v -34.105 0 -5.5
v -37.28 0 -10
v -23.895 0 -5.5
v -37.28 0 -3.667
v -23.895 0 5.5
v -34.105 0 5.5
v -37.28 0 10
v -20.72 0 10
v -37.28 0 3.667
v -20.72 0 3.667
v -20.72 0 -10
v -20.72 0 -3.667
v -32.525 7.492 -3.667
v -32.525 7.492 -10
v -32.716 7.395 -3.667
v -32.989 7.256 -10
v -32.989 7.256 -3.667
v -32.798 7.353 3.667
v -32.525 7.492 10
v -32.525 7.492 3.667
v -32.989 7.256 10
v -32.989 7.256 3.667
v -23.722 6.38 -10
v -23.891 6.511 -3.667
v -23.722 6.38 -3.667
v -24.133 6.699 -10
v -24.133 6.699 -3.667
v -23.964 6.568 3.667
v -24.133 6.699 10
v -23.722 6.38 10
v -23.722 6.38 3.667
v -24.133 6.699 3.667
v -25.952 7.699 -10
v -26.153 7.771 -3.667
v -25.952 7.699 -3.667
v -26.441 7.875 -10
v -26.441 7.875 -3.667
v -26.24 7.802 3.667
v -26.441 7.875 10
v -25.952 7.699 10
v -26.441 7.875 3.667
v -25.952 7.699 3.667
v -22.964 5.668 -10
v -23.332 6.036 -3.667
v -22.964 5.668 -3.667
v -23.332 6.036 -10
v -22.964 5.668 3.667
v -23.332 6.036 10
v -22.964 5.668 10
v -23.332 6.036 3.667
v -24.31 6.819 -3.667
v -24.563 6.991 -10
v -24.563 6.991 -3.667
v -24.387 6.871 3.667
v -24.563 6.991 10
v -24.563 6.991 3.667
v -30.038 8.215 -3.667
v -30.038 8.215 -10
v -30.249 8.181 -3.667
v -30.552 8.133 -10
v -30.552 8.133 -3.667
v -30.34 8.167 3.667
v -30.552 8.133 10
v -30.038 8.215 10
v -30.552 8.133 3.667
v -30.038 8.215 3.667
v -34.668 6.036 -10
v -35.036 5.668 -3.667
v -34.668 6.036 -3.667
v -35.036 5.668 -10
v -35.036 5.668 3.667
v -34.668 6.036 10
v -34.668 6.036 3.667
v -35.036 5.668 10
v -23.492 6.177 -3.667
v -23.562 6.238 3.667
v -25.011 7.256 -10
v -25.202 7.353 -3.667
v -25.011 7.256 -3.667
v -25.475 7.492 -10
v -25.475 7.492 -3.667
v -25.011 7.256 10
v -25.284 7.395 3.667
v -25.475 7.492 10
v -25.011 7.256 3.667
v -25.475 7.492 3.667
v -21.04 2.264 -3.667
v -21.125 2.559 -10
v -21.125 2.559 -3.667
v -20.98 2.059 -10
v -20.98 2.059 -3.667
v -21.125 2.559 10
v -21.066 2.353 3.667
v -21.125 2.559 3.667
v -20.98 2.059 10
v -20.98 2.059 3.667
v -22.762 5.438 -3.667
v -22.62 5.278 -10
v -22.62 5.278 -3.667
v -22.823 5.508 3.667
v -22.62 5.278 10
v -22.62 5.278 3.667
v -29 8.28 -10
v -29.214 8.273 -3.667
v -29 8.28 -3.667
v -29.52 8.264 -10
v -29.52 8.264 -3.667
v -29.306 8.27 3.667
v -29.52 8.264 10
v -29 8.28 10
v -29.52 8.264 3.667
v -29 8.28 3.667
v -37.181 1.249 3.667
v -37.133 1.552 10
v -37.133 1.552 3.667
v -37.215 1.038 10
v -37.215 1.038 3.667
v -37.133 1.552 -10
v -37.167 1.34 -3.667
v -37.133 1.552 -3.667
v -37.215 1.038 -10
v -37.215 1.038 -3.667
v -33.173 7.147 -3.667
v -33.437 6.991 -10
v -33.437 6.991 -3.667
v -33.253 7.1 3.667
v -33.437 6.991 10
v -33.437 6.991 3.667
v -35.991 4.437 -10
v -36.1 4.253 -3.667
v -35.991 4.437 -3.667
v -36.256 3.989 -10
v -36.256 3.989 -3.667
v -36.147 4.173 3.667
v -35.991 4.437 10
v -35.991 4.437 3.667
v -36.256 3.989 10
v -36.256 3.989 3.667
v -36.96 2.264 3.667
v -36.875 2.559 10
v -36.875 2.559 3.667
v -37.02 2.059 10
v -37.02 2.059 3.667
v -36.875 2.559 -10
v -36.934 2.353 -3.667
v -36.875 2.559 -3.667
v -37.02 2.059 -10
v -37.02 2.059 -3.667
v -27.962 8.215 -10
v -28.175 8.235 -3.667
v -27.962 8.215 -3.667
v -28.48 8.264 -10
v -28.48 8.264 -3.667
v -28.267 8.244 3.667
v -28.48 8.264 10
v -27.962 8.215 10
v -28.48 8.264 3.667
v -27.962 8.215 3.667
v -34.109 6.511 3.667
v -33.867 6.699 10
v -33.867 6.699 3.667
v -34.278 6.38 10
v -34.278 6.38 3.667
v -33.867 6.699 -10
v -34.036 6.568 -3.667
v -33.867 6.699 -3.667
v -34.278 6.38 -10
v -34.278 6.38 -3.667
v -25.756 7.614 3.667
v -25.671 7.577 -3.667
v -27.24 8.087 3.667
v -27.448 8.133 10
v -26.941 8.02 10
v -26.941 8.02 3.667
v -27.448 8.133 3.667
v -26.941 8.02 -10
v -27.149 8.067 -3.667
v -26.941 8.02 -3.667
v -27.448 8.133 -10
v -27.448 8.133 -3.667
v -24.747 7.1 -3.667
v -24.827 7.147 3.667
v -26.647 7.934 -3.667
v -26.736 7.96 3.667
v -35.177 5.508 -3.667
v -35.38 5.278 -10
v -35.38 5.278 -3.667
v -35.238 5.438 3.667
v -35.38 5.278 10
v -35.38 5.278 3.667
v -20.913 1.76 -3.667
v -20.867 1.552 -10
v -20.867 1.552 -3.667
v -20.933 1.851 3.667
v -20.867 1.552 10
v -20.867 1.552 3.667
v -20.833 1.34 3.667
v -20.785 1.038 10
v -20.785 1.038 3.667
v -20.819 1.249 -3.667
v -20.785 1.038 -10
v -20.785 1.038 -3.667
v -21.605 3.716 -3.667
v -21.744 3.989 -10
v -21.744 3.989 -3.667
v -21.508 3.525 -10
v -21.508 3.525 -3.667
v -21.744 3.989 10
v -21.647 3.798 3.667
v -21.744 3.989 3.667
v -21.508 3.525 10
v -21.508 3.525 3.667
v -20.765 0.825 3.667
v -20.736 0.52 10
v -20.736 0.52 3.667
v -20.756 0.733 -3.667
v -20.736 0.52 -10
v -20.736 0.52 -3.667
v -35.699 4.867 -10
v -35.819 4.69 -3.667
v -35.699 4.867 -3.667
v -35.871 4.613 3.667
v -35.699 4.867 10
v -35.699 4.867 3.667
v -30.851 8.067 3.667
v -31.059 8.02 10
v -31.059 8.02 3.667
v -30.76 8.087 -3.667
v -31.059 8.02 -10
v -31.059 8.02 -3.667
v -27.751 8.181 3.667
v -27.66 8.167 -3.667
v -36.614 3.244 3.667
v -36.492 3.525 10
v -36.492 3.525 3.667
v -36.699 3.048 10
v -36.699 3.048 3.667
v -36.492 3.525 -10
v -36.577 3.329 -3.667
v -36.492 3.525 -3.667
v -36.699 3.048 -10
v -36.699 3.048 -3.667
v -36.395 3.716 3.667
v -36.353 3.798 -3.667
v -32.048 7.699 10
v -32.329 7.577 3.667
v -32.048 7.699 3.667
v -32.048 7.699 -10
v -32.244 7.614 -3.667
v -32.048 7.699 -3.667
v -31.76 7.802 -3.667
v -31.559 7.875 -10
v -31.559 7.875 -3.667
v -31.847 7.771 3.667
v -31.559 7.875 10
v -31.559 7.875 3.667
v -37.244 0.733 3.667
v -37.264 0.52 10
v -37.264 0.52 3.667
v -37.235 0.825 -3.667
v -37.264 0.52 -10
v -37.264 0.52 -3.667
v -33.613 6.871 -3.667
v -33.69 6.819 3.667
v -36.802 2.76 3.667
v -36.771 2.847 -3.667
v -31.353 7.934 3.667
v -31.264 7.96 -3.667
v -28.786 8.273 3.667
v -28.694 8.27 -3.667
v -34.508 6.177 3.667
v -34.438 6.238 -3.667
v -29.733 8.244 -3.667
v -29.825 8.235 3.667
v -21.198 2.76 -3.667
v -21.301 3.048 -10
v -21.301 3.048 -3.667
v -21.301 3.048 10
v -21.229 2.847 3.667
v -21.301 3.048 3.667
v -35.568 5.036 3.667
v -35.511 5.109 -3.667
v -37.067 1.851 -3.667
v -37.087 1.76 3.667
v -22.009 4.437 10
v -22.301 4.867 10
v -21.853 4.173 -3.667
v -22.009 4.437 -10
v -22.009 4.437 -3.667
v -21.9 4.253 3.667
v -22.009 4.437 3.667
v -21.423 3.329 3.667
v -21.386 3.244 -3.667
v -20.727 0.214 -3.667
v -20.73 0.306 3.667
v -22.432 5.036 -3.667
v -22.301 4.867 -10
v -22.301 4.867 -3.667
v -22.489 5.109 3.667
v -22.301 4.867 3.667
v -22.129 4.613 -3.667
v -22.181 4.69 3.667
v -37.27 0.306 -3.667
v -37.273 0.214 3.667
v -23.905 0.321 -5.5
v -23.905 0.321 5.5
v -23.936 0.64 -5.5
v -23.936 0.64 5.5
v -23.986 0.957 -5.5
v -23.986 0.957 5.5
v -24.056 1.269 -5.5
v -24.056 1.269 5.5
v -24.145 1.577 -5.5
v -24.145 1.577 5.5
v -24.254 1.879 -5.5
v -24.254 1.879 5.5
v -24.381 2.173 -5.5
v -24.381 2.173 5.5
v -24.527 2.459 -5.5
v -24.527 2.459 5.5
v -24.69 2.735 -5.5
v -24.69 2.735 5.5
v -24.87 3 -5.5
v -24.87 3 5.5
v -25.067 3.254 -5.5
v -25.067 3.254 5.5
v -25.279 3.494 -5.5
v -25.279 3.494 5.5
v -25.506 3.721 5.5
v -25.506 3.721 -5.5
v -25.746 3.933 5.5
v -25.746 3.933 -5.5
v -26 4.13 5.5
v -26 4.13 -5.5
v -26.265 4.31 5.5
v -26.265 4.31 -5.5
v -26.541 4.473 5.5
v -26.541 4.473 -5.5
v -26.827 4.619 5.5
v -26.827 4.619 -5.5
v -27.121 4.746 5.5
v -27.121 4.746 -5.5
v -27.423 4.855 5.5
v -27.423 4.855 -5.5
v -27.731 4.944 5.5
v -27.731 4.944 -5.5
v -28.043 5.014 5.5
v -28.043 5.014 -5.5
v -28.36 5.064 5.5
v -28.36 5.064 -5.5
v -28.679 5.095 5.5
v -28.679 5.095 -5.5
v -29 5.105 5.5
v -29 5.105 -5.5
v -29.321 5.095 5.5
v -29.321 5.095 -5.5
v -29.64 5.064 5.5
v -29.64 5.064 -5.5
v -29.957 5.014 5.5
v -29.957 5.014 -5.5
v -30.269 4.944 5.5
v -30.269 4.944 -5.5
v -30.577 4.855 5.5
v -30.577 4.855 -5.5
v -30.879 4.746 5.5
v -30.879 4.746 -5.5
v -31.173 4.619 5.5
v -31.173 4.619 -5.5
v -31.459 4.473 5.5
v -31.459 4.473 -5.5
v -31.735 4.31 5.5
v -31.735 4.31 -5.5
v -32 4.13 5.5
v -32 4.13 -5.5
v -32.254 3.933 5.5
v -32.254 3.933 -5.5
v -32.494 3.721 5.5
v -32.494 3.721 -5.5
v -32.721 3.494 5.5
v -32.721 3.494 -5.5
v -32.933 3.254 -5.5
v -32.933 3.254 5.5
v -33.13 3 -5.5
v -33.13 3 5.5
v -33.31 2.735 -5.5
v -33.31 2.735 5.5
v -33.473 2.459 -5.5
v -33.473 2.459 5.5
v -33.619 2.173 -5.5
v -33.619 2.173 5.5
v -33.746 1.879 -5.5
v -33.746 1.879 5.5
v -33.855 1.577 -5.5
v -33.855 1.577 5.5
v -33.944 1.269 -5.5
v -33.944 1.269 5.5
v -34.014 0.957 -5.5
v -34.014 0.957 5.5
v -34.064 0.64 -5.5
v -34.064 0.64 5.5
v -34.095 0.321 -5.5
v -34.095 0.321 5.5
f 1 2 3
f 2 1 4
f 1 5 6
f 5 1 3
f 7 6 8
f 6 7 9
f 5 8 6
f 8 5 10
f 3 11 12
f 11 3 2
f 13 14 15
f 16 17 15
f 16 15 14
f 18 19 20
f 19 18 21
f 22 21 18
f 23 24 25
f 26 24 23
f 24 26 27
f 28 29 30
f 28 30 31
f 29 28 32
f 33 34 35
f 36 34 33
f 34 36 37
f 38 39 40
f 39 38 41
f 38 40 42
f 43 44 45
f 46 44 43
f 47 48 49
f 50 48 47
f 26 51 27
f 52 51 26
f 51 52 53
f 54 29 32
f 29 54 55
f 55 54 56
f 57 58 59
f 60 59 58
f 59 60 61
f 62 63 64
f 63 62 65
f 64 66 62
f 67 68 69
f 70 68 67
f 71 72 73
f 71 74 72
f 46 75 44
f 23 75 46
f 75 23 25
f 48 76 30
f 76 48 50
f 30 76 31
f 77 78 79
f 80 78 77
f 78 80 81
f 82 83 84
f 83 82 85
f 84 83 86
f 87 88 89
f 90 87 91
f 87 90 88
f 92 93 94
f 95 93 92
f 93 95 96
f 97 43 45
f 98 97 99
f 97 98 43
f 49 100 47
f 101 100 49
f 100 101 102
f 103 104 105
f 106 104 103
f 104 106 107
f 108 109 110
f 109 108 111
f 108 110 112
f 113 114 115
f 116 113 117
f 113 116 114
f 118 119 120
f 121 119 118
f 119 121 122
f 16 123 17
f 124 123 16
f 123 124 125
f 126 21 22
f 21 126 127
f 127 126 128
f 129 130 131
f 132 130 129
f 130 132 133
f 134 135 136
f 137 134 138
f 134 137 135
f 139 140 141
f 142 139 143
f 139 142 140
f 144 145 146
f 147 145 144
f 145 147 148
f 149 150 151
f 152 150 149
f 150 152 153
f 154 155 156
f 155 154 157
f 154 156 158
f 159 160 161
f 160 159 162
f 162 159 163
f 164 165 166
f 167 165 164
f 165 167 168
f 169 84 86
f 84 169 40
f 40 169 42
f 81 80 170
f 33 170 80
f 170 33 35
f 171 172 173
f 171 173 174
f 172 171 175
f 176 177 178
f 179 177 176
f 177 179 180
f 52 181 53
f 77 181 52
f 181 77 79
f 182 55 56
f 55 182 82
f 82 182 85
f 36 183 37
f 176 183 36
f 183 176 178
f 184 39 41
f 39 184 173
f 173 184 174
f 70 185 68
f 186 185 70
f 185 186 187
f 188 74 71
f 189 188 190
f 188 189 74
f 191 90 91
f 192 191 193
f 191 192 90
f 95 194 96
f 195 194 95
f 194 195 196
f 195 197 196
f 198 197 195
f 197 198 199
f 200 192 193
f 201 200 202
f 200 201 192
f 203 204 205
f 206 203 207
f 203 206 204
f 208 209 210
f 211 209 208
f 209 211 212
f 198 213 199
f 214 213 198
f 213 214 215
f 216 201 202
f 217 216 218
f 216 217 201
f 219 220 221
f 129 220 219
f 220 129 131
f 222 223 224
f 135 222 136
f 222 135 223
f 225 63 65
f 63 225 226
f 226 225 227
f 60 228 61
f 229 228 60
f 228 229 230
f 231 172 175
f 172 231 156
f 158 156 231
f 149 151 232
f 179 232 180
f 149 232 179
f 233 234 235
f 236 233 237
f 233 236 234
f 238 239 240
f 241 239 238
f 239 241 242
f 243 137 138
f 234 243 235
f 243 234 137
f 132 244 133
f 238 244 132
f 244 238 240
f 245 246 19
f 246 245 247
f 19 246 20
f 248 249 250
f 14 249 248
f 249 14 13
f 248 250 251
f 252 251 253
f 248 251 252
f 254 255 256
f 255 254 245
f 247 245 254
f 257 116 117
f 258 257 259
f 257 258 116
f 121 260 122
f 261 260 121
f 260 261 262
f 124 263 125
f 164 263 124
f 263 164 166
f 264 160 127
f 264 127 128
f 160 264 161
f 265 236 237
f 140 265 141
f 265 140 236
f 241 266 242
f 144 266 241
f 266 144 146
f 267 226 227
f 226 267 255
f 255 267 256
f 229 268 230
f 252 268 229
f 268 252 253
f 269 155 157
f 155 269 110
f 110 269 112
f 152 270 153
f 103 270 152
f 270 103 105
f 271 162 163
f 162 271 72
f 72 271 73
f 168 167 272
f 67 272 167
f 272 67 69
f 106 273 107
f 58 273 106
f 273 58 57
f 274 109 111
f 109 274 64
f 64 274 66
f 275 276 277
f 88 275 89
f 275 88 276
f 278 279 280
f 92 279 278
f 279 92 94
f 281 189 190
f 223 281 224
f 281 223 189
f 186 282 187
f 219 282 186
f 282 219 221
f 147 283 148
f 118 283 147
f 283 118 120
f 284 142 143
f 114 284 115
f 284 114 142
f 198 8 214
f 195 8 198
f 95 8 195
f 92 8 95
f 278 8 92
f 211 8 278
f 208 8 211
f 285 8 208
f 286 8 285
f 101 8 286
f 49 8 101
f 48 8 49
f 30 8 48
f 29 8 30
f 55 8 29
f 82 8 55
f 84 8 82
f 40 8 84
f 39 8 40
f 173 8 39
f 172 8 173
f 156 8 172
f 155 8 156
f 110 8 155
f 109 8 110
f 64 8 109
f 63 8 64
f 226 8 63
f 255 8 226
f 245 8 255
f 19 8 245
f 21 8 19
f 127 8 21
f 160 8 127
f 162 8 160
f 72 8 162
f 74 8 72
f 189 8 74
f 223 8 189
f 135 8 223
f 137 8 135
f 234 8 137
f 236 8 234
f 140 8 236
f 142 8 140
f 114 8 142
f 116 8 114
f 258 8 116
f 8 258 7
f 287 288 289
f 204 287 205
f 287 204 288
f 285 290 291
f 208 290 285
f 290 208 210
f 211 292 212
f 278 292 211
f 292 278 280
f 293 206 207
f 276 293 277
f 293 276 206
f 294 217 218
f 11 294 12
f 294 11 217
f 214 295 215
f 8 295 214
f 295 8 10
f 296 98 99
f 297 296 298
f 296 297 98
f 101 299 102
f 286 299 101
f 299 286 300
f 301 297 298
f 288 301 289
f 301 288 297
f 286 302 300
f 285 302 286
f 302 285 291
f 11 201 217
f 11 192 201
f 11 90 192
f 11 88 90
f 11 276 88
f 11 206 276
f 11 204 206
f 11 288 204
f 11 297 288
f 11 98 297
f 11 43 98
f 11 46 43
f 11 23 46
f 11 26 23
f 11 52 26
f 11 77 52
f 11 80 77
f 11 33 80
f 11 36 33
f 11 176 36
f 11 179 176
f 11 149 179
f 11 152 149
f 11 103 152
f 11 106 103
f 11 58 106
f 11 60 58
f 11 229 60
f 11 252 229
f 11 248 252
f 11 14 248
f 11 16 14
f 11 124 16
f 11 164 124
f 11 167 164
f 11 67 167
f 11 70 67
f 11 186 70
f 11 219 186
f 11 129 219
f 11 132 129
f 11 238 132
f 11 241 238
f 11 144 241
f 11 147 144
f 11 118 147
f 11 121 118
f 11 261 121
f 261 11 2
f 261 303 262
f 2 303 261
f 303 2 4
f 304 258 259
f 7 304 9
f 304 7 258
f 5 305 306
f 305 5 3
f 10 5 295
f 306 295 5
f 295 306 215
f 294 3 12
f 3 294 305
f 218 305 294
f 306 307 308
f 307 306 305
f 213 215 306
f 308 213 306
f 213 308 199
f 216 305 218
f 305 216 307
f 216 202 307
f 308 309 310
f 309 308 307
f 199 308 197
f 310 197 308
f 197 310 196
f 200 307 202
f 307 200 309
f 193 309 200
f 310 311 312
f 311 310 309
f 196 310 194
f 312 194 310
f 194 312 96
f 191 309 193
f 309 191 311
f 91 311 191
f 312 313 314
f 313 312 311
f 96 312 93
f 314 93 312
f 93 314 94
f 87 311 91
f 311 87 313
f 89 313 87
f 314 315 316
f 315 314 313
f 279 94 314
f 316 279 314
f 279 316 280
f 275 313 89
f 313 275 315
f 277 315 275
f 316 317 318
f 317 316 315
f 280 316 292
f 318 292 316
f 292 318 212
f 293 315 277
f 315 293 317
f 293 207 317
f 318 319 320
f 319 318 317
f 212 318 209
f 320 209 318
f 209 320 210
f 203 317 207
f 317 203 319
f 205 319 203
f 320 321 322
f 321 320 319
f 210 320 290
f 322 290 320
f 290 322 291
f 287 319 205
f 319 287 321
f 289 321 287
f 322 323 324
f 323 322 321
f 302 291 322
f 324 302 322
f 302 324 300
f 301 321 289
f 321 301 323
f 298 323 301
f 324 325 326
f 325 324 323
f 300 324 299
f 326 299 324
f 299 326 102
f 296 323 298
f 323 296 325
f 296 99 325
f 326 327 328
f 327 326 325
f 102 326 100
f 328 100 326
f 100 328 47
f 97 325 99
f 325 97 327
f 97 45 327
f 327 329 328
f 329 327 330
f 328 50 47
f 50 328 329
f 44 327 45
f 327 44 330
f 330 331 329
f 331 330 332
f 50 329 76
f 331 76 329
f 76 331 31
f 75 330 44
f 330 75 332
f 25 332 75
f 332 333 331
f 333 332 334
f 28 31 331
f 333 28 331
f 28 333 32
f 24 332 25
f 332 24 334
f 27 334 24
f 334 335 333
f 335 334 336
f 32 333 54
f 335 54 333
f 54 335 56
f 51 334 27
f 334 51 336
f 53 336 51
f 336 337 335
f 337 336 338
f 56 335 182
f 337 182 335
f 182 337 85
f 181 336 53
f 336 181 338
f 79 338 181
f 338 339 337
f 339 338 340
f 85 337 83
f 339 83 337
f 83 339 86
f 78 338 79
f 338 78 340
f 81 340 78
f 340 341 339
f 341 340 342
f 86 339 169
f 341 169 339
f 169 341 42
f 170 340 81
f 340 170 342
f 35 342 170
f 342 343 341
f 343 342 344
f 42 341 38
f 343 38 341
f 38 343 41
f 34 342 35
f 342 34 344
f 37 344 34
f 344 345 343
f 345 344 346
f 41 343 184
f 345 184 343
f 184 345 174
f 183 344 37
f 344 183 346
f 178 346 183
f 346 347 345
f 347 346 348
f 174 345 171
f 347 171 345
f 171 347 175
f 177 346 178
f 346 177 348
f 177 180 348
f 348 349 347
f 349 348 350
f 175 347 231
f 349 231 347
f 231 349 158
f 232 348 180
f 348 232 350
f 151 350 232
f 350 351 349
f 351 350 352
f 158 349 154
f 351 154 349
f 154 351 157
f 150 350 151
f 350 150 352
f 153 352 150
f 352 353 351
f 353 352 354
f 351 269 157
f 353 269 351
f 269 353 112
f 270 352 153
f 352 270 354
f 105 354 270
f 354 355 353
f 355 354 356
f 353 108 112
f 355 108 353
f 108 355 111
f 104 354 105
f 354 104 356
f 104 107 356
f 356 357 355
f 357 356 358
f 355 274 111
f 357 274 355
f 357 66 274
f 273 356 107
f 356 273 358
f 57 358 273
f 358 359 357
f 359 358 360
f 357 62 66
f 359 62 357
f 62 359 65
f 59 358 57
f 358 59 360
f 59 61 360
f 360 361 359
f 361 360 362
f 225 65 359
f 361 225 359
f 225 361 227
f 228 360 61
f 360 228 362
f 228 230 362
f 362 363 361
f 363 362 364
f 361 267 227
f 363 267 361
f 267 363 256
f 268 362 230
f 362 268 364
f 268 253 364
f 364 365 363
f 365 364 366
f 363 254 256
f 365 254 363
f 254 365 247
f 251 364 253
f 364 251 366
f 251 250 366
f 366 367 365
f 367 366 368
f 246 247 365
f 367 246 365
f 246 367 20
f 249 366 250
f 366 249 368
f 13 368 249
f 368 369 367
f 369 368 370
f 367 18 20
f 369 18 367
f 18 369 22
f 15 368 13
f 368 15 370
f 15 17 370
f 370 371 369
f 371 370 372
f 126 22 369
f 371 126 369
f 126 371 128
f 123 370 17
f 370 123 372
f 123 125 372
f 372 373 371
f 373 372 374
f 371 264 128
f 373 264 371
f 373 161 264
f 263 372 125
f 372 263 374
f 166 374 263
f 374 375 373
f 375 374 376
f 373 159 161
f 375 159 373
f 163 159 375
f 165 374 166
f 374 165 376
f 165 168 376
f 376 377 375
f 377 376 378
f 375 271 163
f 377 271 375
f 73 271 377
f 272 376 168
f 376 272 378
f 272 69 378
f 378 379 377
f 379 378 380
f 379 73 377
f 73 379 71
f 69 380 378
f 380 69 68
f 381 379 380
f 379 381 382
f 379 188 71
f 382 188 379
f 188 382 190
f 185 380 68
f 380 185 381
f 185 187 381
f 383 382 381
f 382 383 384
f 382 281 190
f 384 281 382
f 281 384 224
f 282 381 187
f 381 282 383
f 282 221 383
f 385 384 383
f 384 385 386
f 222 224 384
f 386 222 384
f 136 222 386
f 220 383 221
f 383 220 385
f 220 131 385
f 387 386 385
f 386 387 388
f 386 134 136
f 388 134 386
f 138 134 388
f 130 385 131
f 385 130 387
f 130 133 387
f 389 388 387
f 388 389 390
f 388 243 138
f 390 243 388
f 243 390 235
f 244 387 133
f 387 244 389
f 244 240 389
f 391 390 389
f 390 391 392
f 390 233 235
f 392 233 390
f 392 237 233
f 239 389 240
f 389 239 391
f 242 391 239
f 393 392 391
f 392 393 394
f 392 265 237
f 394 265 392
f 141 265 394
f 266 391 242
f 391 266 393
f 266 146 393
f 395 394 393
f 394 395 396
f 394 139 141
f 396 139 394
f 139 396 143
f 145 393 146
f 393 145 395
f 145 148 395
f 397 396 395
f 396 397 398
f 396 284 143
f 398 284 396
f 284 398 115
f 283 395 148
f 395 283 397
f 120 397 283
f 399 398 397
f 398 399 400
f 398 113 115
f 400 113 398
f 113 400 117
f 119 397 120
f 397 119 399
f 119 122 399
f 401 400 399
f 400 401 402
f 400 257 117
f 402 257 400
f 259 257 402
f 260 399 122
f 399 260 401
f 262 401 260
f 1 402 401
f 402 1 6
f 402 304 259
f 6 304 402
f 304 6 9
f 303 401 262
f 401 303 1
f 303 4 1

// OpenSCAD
$fn = 100;

PRINT_WHOLE = true;

PRINT_TOP_ARCH = false;

SEGMENT_HT = 20;
TAIL_WD = 10;
TAIL_HT = 3;
TOOTH_BITE = 2;
// TAIL_CLEARANCE = 2;


// have decided 18,36,72
// NOMINAL_SEGMENT_RAD = 18;
NOMINAL_SEGMENT_RAD = 36;
// NOMINAL_SEGMENT_RAD = 72;

NEG_COEFF = 0.46;


cylinder_rad = NOMINAL_SEGMENT_RAD;// - TAIL_HT;
segment_rad = cylinder_rad;
neg_segment_rad = NOMINAL_SEGMENT_RAD*NEG_COEFF; //- TAIL_HT;
tail_triangle_rad = (TAIL_WD * sqrt(3))/3;
// tail_triangle_rad = 8;

module body_and_tail(this_cylinder_rad, negative=false){
    NEGATIVE_RAD_OS = 0.75;
    scaled_cylinder_rad = negative ? this_cylinder_rad + NEGATIVE_RAD_OS : this_cylinder_rad;
    scaled_ht = negative ? SEGMENT_HT + 2*NEGATIVE_RAD_OS : SEGMENT_HT;
    difference(){
        // the main cylinder body
        rotate_extrude(angle=180, convexity=10){
            translate([scaled_cylinder_rad/2, 0, 0]){
                square(size=[scaled_cylinder_rad, scaled_ht], center=true);
            }
        }
        // the tail triangle
        rotate_extrude(angle=180, convexity=10){
            // note just the unscaled cylinder rad is used here 
            // because the triangle is scaled up or down we don't need to scale the translation
            translate([this_cylinder_rad, 0, 0]){
                rotate([0, 0, 0]){
                    // if this a negative then we need to scale the triangle
                    // so that the hole is slightly larger than the solid tail
                    triangle_scale = negative ? 1.0 : 1.1;
                    scale([triangle_scale, triangle_scale, 1]){
                        circle(r=tail_triangle_rad, $fn=3);
                    }
                }
            }
        }
    }
}



// !union(){
//     body_and_tail(negative=false);
//     #body_and_tail(negative=true);
    
// }

// because we can't print this as is we need to chop it in half
// 3/8 * nom rad for half printing
// 

module full_segment(){
    HORIZ_COEFF = 0.54;
    VERT_COEFF = 0.8;

    difference(){
        difference(){
            body_and_tail(cylinder_rad, negative=false);
            translate([0, -segment_rad/8, 0]){
                cube([2.5*segment_rad, segment_rad, SEGMENT_HT *1.5], center=true);
            }
        }
        
        if (NOMINAL_SEGMENT_RAD > 18){
            
            
            translate([-segment_rad*HORIZ_COEFF , segment_rad/7, 0]){
                body_and_tail(neg_segment_rad,negative=true);
            }
            translate([segment_rad*HORIZ_COEFF,segment_rad/7 , 0]){
                body_and_tail(neg_segment_rad,negative=true);
            }  
        }
        // translate([-segment_rad*0.54 ,-neg_segment_rad*1.4 , 0]){
        //     negative_segment();
        // }
        // translate([segment_rad*0.54,-neg_segment_rad*1.4 , 0]){
        //     negative_segment();
        // }
    }
    translate([-segment_rad*HORIZ_COEFF , segment_rad/7, ]){
        difference(){
            body_and_tail(neg_segment_rad,negative=false);
            #translate([-segment_rad/4 - 0.5, -segment_rad/7, 0 ]){
                body_and_tail(neg_segment_rad/2,negative=true);
            }

            translate([segment_rad/4 + 0.5, -segment_rad/7, 0 ]){
                body_and_tail(neg_segment_rad/2,negative=true);
            }

        }
    }
    !translate([-segment_rad*(3/4) - 2 ,0 , 0]){
        body_and_tail(neg_segment_rad/2,negative=false);
    }
}

chop_ht = 2/8 * NOMINAL_SEGMENT_RAD;

module chopping_cube(){
    translate([-NOMINAL_SEGMENT_RAD, 
                chop_ht, -0.1]){
        cube([2 * NOMINAL_SEGMENT_RAD, segment_rad, SEGMENT_HT *1.5], 
                center=false);
    }
}

module register_spike(){
    rotate([-90, 0, 0]){
        hull(){
            translate([0, 0, 6]){
                cube([2,2,0.1], center=true);
            }
            cube([3,3,0.1], center=true);
        }
    }
}


module register_spikes(){
    translate([segment_rad*(1/4), chop_ht -1, SEGMENT_HT/2]){
        register_spike();
    }
    translate([-segment_rad*(1/4), chop_ht -1, SEGMENT_HT/2]){
        register_spike();
    }
}
    



// register_spike();


if (PRINT_WHOLE){
    intersection(){
        full_segment();

        // translate([-37, 0, 0]){
        //     cylinder(r=segment_rad/2.5, h=SEGMENT_HT *1.5, center=false);
        // }
    }
}else{

    if (PRINT_TOP_ARCH){
        difference(){
            intersection(){
                full_segment();
                chopping_cube();
            }
            full_segment();
            register_spikes();
        }
        
    }else{
        difference(){
            full_segment();
            chopping_cube();
        }

        register_spikes();
        
    }
}
